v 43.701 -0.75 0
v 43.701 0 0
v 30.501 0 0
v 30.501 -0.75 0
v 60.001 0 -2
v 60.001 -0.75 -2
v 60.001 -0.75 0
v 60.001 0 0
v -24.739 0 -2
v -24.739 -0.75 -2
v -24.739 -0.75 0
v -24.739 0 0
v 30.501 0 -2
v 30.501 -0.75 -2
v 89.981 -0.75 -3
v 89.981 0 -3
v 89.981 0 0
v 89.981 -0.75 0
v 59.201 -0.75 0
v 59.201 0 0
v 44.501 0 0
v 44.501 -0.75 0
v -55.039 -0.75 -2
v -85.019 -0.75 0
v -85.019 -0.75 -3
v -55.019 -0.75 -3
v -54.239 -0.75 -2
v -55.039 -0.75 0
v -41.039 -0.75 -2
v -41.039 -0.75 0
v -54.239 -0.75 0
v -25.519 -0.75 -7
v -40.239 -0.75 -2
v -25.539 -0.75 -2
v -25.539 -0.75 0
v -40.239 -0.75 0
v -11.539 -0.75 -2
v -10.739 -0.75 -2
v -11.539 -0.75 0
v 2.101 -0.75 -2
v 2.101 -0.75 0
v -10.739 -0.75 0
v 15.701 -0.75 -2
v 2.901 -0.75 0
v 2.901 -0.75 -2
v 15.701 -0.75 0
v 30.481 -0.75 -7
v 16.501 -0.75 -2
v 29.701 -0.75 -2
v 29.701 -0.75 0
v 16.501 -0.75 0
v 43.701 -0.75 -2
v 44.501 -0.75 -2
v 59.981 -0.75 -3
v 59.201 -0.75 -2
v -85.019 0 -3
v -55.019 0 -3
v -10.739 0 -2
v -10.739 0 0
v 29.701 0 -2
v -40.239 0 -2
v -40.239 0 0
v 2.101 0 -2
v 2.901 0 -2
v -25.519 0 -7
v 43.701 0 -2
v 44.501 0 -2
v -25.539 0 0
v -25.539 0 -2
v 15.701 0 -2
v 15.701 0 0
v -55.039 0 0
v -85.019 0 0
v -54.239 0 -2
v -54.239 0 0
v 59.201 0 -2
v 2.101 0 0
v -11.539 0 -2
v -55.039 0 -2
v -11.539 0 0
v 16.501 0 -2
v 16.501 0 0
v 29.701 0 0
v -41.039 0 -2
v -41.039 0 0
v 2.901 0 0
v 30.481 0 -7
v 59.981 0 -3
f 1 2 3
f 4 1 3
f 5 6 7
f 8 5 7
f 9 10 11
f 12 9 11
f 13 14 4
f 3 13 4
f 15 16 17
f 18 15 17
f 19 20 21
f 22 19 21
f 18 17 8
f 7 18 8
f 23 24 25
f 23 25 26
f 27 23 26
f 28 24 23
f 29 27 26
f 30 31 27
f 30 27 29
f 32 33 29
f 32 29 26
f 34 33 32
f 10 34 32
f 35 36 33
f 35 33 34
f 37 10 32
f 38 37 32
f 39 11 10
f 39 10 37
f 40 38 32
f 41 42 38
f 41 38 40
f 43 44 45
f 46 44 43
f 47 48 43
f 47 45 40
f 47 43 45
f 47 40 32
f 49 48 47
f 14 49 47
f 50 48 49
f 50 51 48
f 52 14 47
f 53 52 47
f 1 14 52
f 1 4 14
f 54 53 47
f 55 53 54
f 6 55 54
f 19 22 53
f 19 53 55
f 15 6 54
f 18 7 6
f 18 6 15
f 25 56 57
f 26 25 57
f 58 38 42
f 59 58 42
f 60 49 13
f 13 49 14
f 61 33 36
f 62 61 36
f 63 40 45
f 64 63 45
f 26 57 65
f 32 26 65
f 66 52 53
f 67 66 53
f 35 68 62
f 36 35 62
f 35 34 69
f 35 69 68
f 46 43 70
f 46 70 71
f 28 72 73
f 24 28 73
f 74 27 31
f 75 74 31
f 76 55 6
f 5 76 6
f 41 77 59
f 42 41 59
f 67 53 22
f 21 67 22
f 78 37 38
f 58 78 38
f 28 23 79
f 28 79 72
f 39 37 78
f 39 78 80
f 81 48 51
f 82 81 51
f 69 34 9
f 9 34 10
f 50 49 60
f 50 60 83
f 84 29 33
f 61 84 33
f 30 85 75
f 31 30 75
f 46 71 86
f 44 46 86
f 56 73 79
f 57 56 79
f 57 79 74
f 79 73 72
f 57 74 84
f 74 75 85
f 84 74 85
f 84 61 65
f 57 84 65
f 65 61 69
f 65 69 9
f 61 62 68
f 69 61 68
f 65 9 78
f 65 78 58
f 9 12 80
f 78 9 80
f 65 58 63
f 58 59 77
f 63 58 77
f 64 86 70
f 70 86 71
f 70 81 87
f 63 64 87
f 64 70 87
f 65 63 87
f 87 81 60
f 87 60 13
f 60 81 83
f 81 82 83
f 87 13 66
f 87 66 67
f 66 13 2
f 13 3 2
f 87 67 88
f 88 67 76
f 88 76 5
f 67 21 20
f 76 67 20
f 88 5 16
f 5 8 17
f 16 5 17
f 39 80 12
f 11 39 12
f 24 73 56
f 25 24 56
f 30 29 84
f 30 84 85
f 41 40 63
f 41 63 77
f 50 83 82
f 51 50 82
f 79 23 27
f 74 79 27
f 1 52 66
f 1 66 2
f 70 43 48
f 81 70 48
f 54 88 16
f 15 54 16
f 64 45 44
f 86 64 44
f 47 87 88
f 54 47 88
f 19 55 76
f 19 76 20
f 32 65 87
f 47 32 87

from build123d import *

# Parameters (mm, degrees)
F1_DEPTH  = 0.75
F2_W      = 0.8
F2_H      = 2
F3_DEPTH  = 0.751
F4_W      = 0.8
F4_H      = 2
F5_DEPTH  = 0.751
F6_W      = 0.8
F6_H      = 2
F7_DEPTH  = 0.751
F8_W      = 0.8
F8_H      = 2
F9_DEPTH  = 0.751
F10_W     = 0.8
F10_H     = 2
F11_DEPTH = 0.751
F12_W     = 0.8
F12_H     = 2
F13_DEPTH = 0.751
F14_W     = 0.8
F14_H     = 2
F15_DEPTH = 0.751
F16_W     = 0.8
F16_H     = 2
F17_DEPTH = 0.751
F18_W     = 0.8
F18_H     = 2
F19_DEPTH = 0.751


with BuildPart() as f1:
    # F0 (on Front) → F1 (new body)
    with BuildSketch(Plane.XZ):
        Polygon((89.981408, 0), (-85.018592, 0), (-85.018592, -3), (-55.018592, -3), (-25.518592, -7), (30.481408, -7), (59.981408, -3), (89.981408, -3), align=None)
    extrude(amount=F1_DEPTH)

    # F2 (on face) → F3 (cut, through all)
    with BuildSketch(Plane.XZ.offset(0.75)):
        with Locations((-54.638592, -1)):
            Rectangle(F2_W, F2_H)
    extrude(amount=-F3_DEPTH, mode=Mode.SUBTRACT)

    # F4 (on face) → F5 (cut, through all)
    with BuildSketch(Plane.XZ.offset(0.75)):
        with Locations((-40.638592, -1)):
            Rectangle(F4_W, F4_H)
    extrude(amount=-F5_DEPTH, mode=Mode.SUBTRACT)

    # F6 (on face) → F7 (cut, through all)
    with BuildSketch(Plane.XZ.offset(0.75)):
        with Locations((-25.138592, -1)):
            Rectangle(F6_W, F6_H)
    extrude(amount=-F7_DEPTH, mode=Mode.SUBTRACT)

    # F8 (on face) → F9 (cut, through all)
    with BuildSketch(Plane.XZ.offset(0.75)):
        with Locations((-11.138592, -1)):
            Rectangle(F8_W, F8_H)
    extrude(amount=-F9_DEPTH, mode=Mode.SUBTRACT)

    # F10 (on face) → F11 (cut, through all)
    with BuildSketch(Plane.XZ.offset(0.75)):
        with Locations((2.501408, -1)):
            Rectangle(F10_W, F10_H)
    extrude(amount=-F11_DEPTH, mode=Mode.SUBTRACT)

    # F12 (on face) → F13 (cut, through all)
    with BuildSketch(Plane.XZ.offset(0.75)):
        with Locations((16.101408, -1)):
            Rectangle(F12_W, F12_H)
    extrude(amount=-F13_DEPTH, mode=Mode.SUBTRACT)

    # F14 (on face) → F15 (cut, through all)
    with BuildSketch(Plane.XZ.offset(0.75)):
        with Locations((30.101408, -1)):
            Rectangle(F14_W, F14_H)
    extrude(amount=-F15_DEPTH, mode=Mode.SUBTRACT)

    # F16 (on face) → F17 (cut, through all)
    with BuildSketch(Plane.XZ.offset(0.75)):
        with Locations((44.101408, -1)):
            Rectangle(F16_W, F16_H)
    extrude(amount=-F17_DEPTH, mode=Mode.SUBTRACT)

    # F18 (on face) → F19 (cut, through all)
    with BuildSketch(Plane.XZ.offset(0.75)):
        with Locations((59.601408, -1)):
            Rectangle(F18_W, F18_H)
    extrude(amount=-F19_DEPTH, mode=Mode.SUBTRACT)


solid = f1.part
